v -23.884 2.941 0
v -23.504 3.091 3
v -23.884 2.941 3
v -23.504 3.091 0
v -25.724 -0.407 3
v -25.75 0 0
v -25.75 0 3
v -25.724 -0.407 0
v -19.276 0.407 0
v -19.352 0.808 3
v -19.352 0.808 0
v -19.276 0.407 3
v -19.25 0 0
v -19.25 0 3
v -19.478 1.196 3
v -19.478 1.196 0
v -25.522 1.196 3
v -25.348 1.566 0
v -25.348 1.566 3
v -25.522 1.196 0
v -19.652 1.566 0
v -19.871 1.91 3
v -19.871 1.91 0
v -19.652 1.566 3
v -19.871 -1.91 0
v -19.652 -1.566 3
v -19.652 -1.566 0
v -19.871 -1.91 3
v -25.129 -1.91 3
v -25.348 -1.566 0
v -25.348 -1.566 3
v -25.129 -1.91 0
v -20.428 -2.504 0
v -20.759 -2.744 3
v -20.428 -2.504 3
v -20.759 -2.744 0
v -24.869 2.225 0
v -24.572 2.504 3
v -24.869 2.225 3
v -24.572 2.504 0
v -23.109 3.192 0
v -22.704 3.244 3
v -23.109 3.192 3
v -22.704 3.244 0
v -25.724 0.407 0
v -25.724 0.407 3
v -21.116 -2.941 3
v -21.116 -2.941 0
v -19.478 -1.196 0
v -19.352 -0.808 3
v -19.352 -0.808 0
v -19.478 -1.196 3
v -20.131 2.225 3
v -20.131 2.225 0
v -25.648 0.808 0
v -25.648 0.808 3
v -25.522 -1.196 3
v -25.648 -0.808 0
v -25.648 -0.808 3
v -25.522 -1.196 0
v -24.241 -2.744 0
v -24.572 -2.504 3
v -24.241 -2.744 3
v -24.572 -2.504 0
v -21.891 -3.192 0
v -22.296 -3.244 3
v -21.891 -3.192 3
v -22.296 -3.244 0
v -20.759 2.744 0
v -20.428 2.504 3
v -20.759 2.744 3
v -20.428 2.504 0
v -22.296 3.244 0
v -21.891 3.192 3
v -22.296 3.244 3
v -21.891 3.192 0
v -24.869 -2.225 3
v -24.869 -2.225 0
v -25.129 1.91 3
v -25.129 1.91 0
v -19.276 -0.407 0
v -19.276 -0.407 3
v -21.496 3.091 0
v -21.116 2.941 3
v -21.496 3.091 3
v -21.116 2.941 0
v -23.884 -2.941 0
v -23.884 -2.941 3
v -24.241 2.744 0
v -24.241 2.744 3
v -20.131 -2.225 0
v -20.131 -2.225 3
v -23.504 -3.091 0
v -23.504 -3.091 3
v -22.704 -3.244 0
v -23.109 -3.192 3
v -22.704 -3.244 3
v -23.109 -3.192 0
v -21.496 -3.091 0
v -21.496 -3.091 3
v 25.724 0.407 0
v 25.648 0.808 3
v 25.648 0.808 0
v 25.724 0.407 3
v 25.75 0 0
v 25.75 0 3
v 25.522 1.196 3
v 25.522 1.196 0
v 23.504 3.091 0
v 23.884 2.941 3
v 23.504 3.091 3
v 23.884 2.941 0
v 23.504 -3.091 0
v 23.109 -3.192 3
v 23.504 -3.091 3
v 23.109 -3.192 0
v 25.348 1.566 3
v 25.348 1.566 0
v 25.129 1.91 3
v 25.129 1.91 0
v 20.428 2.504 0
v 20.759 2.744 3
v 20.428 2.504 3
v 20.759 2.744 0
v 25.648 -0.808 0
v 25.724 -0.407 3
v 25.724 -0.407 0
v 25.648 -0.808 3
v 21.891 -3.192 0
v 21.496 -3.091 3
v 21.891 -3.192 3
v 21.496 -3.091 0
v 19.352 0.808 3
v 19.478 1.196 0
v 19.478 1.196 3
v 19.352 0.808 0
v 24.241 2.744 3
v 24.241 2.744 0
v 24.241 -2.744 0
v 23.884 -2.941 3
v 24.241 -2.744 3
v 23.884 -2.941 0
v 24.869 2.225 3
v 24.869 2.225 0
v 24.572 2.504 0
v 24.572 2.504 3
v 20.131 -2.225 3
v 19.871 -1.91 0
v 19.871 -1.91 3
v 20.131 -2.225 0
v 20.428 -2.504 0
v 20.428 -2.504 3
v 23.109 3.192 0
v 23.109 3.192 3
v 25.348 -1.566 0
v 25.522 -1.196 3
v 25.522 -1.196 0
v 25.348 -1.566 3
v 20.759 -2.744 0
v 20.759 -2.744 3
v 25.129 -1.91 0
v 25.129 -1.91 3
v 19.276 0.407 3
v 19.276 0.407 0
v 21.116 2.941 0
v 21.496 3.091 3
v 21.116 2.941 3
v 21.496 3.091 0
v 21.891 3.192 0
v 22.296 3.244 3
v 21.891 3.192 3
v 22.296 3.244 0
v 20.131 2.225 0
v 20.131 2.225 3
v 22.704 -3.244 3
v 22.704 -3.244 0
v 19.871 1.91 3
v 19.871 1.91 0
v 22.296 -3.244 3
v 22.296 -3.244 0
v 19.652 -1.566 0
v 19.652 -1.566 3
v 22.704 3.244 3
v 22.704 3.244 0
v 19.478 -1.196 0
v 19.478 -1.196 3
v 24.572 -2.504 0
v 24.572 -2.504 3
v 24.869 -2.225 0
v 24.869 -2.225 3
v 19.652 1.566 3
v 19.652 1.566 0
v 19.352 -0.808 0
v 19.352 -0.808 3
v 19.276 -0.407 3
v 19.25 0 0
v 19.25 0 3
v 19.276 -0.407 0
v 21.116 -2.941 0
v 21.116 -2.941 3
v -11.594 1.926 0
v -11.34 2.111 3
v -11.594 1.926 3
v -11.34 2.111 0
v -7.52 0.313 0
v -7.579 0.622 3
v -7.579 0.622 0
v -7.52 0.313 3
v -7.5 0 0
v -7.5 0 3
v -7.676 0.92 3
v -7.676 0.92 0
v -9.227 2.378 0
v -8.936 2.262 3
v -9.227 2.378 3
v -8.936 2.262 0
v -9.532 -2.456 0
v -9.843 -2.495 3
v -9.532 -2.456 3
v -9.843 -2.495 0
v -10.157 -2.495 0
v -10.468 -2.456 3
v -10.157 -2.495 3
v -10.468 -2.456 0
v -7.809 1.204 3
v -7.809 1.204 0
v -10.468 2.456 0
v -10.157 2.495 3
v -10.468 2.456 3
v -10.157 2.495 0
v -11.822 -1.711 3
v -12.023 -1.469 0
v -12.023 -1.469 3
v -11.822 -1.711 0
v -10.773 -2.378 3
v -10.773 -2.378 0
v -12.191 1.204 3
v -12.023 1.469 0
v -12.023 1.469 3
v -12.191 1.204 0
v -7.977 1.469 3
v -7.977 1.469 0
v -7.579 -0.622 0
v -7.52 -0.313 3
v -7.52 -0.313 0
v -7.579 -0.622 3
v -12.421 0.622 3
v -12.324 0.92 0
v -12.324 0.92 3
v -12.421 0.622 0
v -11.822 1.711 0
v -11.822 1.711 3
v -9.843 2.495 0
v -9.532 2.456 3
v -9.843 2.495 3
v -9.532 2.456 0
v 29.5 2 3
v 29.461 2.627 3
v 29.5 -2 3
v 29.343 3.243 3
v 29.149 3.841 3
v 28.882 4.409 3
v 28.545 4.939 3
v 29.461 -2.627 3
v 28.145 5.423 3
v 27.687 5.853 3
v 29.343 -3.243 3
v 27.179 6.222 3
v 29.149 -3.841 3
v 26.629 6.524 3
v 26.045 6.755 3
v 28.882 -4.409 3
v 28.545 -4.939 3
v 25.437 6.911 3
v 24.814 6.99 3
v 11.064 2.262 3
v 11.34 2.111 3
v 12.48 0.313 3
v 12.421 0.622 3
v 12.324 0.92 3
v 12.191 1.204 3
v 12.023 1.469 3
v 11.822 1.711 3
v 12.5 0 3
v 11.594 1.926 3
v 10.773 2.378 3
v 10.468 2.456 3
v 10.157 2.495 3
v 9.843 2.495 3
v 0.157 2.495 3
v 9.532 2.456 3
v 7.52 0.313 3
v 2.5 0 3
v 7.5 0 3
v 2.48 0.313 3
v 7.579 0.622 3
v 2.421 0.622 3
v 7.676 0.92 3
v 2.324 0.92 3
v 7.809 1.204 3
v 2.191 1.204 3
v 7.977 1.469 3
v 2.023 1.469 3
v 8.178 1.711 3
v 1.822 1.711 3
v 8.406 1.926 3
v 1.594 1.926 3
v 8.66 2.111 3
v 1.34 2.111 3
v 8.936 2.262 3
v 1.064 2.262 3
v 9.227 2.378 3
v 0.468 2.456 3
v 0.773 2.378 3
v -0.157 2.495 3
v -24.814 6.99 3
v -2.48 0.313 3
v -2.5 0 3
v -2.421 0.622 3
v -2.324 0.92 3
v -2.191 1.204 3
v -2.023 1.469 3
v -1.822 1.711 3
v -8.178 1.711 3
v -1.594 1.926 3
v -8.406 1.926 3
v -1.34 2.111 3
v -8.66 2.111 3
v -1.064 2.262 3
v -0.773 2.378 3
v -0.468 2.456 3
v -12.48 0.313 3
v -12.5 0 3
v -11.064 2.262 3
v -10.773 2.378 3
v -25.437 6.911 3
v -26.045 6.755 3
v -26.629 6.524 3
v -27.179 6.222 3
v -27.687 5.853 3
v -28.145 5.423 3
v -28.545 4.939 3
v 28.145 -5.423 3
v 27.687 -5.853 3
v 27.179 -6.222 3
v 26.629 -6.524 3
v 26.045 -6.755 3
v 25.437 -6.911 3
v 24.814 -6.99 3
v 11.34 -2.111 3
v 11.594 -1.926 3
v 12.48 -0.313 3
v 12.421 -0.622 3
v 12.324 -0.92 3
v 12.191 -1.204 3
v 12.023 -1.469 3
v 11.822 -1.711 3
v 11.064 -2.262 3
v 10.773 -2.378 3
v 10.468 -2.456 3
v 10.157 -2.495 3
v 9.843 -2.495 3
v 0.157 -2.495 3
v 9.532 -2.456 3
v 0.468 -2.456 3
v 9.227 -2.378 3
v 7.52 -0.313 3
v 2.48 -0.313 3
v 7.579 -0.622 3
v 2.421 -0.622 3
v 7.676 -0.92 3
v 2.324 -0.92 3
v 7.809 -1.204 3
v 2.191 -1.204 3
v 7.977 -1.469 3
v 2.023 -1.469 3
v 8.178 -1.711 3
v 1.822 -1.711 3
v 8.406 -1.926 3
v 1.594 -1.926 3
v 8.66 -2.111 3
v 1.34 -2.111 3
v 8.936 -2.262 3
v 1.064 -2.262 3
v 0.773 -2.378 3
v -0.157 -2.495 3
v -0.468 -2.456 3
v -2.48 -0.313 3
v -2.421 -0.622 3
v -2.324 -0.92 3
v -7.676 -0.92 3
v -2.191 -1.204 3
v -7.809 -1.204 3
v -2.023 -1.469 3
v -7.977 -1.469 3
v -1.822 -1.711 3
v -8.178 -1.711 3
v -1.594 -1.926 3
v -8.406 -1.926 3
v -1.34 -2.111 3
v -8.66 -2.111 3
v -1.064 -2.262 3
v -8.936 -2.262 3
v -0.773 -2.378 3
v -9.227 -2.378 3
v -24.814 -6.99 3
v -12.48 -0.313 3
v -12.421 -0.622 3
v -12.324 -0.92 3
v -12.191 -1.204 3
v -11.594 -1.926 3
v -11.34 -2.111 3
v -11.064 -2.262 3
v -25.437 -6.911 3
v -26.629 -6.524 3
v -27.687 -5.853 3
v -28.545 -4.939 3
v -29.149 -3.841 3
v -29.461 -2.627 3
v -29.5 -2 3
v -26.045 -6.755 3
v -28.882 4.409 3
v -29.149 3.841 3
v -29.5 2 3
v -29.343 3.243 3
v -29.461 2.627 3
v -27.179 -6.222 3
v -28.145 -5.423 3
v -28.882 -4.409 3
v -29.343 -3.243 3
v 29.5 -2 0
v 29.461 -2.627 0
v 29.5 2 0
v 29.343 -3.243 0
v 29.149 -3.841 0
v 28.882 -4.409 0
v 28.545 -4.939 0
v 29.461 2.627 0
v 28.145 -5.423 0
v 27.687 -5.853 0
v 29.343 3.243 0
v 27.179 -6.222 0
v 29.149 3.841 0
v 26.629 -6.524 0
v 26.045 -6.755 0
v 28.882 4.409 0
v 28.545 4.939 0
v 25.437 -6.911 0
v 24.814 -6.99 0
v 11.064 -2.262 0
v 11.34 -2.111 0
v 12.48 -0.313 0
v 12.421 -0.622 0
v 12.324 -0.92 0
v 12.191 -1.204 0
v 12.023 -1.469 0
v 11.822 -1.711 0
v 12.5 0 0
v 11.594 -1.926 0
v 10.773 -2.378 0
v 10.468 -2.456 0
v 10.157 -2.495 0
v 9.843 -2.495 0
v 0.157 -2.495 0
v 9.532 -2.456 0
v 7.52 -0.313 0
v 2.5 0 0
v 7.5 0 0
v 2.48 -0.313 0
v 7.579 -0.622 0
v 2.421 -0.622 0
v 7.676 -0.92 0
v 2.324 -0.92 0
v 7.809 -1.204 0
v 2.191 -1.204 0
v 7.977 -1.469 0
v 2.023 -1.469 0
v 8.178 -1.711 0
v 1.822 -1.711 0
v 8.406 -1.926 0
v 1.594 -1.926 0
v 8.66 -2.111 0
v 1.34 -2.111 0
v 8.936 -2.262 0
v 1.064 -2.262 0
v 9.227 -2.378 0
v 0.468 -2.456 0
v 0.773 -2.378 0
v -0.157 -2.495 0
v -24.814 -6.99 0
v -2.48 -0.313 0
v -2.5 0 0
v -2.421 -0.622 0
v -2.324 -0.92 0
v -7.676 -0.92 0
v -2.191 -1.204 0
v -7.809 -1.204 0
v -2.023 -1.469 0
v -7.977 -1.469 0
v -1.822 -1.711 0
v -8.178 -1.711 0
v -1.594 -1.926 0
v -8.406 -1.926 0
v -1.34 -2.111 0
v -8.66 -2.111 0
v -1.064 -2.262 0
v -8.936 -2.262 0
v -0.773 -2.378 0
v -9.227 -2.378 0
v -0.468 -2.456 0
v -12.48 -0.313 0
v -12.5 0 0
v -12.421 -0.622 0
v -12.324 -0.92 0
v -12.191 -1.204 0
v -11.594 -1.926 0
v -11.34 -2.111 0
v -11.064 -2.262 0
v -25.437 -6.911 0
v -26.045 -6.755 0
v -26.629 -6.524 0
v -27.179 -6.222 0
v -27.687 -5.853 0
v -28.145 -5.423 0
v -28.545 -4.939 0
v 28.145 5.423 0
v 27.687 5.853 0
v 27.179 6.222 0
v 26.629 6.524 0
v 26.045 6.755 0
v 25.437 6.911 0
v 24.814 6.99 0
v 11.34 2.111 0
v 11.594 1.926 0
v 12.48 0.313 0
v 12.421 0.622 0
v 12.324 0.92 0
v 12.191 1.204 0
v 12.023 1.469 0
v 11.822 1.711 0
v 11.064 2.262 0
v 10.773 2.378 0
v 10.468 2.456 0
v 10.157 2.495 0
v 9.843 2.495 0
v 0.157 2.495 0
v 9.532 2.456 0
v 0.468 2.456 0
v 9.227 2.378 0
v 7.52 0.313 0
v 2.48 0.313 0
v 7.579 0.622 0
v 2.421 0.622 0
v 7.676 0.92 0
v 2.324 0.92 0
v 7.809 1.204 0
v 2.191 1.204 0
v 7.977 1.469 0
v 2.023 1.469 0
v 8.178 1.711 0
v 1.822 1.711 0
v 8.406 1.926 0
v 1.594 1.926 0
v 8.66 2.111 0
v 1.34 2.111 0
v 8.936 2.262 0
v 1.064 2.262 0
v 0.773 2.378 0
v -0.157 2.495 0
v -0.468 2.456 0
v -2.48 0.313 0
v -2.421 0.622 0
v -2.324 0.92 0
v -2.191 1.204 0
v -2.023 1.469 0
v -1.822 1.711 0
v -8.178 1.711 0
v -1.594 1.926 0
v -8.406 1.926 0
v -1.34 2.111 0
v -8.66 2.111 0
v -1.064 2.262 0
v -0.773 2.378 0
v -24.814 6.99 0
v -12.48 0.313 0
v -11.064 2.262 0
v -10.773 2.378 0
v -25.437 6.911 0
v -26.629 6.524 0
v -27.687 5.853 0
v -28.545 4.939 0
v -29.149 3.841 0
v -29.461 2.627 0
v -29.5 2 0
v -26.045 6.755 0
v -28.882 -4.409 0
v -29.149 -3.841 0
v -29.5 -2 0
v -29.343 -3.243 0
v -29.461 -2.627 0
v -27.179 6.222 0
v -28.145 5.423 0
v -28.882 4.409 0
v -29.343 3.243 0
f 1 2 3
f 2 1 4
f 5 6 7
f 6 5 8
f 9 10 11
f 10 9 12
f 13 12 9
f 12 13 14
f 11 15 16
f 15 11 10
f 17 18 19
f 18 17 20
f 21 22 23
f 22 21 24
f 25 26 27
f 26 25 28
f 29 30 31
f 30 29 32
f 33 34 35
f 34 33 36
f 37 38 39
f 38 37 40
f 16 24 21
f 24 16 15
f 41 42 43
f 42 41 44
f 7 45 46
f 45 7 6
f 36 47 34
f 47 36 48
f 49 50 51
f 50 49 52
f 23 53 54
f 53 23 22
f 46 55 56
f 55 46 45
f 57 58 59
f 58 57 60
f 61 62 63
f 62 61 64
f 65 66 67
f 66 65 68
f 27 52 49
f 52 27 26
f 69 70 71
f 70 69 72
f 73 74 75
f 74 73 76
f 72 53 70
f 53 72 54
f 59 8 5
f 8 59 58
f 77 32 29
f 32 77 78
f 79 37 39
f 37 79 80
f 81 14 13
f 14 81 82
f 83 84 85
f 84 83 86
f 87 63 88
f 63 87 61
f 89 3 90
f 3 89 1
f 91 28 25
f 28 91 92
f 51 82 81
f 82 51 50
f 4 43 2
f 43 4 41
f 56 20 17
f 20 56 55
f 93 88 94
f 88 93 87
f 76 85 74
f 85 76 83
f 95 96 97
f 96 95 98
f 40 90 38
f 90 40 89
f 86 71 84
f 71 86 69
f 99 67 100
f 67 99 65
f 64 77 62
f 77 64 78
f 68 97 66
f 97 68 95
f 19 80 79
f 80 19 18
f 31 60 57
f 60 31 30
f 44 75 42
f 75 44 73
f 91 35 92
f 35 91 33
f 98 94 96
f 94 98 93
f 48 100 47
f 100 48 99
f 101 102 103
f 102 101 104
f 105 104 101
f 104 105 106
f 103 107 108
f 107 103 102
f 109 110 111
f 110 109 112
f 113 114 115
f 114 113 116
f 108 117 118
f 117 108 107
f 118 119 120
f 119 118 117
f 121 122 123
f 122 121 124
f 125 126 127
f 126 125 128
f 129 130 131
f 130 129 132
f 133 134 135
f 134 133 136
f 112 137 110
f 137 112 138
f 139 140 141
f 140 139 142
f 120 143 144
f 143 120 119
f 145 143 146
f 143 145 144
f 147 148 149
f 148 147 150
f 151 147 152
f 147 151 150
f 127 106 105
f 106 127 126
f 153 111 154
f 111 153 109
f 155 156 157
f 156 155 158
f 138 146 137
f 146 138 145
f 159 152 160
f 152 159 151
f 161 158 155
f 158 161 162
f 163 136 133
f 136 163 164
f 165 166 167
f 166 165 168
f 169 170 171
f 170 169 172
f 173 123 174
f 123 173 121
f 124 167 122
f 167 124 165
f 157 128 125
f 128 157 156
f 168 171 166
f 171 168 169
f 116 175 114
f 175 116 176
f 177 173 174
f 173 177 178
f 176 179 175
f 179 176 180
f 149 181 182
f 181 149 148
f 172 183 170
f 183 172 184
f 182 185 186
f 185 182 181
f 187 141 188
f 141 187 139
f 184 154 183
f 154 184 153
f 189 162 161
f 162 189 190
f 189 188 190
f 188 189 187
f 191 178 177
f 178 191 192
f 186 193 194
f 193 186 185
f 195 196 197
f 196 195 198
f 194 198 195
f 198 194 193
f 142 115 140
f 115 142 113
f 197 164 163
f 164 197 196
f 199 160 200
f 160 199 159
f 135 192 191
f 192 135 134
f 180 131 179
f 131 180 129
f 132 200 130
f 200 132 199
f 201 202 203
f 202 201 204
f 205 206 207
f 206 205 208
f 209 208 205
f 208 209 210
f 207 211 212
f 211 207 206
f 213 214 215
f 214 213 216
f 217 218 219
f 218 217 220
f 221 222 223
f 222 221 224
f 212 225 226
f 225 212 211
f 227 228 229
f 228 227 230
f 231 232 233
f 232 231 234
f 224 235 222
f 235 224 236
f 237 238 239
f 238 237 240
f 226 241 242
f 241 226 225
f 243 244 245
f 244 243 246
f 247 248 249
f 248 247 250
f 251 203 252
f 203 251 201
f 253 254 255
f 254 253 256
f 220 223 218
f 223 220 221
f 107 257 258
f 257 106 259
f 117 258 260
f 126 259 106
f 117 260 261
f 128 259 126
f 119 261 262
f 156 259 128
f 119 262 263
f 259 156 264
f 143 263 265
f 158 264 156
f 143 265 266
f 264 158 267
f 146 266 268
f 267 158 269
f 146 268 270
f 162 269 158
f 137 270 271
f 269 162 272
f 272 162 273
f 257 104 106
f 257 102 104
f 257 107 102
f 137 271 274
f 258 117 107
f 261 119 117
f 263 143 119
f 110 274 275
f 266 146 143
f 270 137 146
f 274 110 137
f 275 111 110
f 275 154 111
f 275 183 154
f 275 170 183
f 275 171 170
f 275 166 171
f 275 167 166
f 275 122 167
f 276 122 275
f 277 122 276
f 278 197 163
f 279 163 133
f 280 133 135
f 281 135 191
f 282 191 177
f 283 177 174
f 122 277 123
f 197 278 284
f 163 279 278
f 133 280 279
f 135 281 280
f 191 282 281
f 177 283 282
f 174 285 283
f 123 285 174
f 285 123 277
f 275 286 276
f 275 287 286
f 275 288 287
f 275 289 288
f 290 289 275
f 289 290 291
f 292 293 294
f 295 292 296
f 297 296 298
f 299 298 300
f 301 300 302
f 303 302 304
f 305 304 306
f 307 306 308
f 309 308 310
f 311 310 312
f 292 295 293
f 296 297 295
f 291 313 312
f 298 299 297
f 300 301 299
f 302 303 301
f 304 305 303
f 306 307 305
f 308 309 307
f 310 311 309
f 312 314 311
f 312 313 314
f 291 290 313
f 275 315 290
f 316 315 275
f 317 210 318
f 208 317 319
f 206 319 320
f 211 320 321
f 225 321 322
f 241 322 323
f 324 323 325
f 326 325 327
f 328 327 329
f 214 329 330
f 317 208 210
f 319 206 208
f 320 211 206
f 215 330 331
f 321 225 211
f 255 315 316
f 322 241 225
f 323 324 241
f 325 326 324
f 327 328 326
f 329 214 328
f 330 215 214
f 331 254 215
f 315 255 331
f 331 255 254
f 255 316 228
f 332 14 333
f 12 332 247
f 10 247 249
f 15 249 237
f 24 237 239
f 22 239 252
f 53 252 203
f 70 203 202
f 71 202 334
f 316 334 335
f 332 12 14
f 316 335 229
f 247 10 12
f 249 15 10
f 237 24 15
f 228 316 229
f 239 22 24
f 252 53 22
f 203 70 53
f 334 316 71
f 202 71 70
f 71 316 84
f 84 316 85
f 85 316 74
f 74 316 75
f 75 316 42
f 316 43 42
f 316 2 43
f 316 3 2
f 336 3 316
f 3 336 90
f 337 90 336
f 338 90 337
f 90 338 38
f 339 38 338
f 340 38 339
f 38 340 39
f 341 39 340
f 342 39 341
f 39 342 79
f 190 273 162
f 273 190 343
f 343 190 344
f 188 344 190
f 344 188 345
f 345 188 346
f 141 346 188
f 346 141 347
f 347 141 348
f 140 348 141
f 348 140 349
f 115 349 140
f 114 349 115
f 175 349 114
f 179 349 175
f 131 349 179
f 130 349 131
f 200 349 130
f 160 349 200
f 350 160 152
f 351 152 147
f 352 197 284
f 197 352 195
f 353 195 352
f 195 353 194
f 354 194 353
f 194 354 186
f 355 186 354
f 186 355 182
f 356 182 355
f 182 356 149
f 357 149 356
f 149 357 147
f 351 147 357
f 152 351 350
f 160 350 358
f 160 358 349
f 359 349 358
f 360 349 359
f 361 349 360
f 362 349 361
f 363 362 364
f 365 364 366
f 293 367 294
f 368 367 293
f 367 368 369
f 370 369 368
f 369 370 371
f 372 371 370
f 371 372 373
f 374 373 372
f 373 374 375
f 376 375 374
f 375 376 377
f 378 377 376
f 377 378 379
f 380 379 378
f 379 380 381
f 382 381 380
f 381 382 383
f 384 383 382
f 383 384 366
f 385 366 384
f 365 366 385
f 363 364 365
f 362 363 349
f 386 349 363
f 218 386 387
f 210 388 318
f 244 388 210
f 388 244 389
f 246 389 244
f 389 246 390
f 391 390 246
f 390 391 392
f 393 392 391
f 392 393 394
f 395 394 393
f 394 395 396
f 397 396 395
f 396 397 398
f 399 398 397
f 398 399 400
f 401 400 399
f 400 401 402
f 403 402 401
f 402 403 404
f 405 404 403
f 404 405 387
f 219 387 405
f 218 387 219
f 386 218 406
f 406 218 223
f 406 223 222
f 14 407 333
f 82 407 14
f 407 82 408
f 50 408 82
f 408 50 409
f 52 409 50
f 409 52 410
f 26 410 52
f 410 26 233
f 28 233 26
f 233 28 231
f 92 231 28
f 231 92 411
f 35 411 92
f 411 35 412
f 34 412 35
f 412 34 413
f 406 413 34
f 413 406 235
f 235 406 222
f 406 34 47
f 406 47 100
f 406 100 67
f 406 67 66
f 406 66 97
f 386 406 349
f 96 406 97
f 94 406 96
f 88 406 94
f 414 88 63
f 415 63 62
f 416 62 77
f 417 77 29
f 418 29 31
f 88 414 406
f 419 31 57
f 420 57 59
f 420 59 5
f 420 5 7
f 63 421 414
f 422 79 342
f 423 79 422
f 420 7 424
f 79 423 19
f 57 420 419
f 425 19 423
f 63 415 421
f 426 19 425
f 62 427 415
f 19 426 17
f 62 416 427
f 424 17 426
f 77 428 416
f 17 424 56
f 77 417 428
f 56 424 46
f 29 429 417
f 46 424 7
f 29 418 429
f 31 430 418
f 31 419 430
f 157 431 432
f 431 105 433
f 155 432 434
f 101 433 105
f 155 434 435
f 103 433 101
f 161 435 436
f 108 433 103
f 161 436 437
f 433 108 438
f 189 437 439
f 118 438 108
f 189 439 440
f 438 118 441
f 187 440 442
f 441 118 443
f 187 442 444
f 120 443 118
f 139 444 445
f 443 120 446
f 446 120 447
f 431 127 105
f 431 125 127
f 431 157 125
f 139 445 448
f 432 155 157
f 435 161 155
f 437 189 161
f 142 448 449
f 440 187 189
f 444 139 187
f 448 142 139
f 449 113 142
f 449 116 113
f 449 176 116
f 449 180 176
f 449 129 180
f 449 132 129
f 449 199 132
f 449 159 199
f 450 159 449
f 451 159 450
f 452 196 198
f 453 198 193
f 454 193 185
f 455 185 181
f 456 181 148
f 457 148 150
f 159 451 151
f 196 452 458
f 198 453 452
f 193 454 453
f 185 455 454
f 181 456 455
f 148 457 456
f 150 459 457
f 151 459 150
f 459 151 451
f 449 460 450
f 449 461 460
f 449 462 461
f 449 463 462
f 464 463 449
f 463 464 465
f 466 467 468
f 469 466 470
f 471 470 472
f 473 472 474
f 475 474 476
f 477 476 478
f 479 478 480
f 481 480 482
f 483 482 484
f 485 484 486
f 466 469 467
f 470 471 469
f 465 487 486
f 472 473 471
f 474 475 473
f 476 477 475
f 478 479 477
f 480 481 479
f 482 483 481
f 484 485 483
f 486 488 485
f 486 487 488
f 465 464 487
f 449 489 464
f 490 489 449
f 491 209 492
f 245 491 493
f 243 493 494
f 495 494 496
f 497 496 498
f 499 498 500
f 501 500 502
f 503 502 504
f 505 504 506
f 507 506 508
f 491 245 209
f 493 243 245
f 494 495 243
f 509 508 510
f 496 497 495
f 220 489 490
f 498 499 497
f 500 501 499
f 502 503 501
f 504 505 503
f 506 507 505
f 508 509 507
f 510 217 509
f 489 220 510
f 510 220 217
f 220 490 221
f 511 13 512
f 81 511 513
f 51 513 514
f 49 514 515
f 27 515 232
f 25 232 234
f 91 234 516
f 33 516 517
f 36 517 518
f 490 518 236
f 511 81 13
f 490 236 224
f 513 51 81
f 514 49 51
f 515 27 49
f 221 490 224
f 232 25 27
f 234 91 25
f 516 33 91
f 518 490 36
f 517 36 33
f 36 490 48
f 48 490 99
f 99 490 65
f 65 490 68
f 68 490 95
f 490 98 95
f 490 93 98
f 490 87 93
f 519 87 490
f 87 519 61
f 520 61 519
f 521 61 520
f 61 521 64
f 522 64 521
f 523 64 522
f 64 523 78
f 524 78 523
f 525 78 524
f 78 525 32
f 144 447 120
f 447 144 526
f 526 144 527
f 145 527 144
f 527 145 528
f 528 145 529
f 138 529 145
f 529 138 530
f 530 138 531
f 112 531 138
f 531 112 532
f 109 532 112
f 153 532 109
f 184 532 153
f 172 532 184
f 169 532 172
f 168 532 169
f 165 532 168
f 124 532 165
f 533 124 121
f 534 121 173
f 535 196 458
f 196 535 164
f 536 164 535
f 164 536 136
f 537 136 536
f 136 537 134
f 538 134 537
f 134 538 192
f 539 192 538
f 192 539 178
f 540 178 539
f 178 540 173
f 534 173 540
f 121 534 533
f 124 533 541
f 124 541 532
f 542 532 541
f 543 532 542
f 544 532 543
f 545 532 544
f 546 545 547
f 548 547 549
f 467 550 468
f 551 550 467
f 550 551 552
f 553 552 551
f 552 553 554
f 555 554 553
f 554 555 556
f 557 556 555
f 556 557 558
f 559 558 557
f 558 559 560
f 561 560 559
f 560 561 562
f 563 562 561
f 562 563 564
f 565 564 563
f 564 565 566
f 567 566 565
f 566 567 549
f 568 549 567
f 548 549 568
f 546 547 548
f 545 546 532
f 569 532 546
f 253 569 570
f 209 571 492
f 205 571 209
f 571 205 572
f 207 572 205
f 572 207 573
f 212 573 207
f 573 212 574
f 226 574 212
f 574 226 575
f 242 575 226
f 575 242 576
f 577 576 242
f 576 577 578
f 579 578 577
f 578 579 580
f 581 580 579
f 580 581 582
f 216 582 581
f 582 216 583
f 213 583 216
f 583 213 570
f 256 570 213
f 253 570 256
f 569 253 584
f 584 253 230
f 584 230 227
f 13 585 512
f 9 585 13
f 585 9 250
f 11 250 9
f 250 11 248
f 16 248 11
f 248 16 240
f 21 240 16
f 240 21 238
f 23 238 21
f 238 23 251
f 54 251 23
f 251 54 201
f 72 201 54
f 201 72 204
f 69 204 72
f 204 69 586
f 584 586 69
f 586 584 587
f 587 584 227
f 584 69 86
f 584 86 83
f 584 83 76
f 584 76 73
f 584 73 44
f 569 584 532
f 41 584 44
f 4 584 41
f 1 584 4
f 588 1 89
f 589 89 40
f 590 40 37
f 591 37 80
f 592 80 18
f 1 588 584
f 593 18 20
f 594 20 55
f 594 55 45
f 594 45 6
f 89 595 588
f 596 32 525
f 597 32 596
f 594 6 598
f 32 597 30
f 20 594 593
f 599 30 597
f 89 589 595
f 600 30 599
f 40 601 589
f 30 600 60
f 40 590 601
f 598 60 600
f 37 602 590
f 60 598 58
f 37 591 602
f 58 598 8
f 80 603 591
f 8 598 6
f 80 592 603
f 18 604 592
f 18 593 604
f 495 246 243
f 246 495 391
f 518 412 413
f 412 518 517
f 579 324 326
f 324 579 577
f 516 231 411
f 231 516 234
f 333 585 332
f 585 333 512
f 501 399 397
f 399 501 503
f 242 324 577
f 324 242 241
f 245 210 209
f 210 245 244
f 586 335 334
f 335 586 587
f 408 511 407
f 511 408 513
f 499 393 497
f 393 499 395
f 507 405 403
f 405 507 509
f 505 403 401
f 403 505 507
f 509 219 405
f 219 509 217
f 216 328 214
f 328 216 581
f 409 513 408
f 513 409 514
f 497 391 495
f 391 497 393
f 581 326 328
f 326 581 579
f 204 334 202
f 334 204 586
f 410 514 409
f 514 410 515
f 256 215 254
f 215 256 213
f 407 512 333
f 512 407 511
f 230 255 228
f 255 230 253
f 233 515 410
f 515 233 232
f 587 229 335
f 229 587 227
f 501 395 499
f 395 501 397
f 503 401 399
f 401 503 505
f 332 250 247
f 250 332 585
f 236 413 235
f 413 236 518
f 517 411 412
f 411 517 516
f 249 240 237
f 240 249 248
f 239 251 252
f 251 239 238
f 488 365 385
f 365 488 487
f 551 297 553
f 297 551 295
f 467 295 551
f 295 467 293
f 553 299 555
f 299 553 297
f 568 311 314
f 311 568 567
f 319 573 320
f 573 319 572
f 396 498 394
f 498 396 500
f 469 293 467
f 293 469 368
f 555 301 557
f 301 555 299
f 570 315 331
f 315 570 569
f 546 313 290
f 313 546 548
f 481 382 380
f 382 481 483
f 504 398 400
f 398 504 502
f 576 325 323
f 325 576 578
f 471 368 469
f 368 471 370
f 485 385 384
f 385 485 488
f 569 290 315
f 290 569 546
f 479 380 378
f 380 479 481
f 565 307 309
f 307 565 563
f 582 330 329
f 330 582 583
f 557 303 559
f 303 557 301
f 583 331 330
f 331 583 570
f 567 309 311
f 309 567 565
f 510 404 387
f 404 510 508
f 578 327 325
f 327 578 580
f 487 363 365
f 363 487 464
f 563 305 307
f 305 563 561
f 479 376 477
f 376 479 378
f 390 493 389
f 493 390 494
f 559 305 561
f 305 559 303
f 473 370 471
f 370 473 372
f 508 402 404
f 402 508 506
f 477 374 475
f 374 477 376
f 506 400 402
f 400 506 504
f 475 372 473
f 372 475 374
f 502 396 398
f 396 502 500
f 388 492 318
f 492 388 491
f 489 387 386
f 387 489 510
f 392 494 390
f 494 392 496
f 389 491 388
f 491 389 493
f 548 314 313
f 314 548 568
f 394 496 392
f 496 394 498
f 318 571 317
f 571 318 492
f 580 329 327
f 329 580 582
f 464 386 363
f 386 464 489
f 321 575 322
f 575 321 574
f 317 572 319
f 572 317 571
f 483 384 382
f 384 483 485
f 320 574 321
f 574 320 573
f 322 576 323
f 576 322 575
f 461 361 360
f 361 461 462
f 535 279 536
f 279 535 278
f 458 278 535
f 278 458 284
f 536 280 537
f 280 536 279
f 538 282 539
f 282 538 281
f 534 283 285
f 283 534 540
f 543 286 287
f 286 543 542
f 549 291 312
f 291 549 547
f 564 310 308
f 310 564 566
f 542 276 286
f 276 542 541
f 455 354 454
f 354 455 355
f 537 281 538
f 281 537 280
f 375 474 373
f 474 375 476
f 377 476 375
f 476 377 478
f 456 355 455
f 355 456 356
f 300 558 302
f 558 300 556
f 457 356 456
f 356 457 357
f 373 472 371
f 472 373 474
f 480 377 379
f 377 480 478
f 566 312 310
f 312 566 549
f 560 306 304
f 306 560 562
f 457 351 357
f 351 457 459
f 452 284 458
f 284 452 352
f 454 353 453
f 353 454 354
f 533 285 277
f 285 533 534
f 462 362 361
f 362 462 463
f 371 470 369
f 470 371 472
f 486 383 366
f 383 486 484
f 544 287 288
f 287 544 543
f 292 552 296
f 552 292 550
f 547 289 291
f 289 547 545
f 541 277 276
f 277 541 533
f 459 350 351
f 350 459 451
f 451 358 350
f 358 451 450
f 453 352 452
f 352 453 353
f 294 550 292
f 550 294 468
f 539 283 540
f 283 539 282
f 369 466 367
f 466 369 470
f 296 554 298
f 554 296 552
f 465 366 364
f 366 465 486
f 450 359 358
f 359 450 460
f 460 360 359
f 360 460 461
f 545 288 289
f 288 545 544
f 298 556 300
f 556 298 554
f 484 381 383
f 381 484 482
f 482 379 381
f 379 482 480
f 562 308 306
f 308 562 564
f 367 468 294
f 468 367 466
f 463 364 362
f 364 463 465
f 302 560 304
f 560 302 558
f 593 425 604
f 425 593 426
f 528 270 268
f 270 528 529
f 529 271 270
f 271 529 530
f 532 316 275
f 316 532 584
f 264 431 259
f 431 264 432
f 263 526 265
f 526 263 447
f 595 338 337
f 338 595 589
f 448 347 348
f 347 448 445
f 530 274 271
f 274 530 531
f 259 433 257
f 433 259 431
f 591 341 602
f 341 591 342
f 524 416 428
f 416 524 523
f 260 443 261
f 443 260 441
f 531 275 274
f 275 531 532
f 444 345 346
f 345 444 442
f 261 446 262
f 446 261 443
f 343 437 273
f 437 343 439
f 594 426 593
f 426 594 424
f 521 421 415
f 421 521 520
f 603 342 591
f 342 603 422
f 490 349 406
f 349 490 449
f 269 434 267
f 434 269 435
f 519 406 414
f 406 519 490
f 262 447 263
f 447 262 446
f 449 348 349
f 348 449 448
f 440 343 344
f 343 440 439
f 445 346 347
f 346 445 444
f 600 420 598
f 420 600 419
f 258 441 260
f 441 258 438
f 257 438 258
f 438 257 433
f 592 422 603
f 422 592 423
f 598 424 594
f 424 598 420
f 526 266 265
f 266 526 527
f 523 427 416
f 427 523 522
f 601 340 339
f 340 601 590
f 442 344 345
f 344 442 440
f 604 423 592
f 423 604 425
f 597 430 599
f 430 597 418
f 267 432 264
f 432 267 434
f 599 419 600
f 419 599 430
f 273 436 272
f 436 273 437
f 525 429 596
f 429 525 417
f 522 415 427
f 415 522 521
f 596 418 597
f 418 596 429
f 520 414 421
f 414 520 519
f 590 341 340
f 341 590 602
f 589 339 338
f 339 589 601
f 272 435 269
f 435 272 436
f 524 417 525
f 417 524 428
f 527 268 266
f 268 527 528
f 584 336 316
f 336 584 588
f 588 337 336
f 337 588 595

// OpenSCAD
$fn = 50;


difference() {
	union() {
		hull() {
			translate(v = [-24.5000000000, 2.0000000000, 0]) {
				cylinder(h = 3, r = 5);
			}
			translate(v = [24.5000000000, 2.0000000000, 0]) {
				cylinder(h = 3, r = 5);
			}
			translate(v = [-24.5000000000, -2.0000000000, 0]) {
				cylinder(h = 3, r = 5);
			}
			translate(v = [24.5000000000, -2.0000000000, 0]) {
				cylinder(h = 3, r = 5);
			}
		}
	}
	union() {
		#translate(v = [-22.5000000000, 0.0000000000, 0]) {
			cylinder(h = 3, r = 3.2500000000);
		}
		#translate(v = [22.5000000000, 0.0000000000, 0]) {
			cylinder(h = 3, r = 3.2500000000);
		}
		#translate(v = [-22.5000000000, 0.0000000000, -100.0000000000]) {
			cylinder(h = 200, r = 3.2500000000);
		}
		#translate(v = [-22.5000000000, 0.0000000000, -100.0000000000]) {
			cylinder(h = 200, r = 3.2500000000);
		}
		#translate(v = [22.5000000000, 0.0000000000, -100.0000000000]) {
			cylinder(h = 200, r = 3.2500000000);
		}
		#translate(v = [22.5000000000, 0.0000000000, -100.0000000000]) {
			cylinder(h = 200, r = 3.2500000000);
		}
		#translate(v = [-22.5000000000, 0.0000000000, 0]) {
			cylinder(h = 3, r = 1.8000000000);
		}
		#translate(v = [22.5000000000, 0.0000000000, 0]) {
			cylinder(h = 3, r = 1.8000000000);
		}
		#translate(v = [-22.5000000000, 0.0000000000, 0]) {
			cylinder(h = 3, r = 1.8000000000);
		}
		#translate(v = [22.5000000000, 0.0000000000, 0]) {
			cylinder(h = 3, r = 1.8000000000);
		}
		#translate(v = [-22.5000000000, 0.0000000000, 0]) {
			cylinder(h = 3, r = 1.8000000000);
		}
		#translate(v = [22.5000000000, 0.0000000000, 0]) {
			cylinder(h = 3, r = 1.8000000000);
		}
		#translate(v = [-10.0000000000, 0, 0]) {
			cylinder(h = 3, r = 2.5000000000);
		}
		#cylinder(h = 3, r = 2.5000000000);
		#translate(v = [10.0000000000, 0, 0]) {
			cylinder(h = 3, r = 2.5000000000);
		}
	}
}
